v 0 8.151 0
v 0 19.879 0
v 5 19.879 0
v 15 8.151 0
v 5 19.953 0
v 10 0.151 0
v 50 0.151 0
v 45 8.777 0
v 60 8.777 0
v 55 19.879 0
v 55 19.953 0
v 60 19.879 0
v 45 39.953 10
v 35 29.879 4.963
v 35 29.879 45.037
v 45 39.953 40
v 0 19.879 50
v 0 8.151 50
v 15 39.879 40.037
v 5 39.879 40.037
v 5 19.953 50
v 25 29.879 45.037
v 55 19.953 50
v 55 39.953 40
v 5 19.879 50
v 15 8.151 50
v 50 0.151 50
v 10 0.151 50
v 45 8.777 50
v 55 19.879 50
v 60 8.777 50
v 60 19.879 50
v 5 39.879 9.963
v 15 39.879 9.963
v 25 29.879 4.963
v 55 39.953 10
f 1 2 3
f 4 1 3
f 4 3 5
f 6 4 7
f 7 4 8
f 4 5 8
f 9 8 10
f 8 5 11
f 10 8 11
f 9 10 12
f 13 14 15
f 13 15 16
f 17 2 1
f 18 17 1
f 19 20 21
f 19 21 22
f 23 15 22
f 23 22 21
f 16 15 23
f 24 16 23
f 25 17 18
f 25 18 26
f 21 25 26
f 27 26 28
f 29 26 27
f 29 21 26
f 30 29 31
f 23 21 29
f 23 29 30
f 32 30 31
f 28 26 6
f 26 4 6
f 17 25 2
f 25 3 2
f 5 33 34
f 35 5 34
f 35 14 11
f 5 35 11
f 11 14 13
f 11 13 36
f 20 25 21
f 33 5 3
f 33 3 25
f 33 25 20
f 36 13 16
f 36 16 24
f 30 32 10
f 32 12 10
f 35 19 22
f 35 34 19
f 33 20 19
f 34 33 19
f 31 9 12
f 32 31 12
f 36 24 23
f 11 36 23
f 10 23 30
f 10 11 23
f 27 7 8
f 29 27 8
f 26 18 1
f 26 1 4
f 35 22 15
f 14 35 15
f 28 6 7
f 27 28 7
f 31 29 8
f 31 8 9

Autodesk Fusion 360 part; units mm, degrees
sketch "Front View" plane through (0, 0, 0) normal (0, 0, 1) x (1, 0, 0)
  line L0 (0, 19.879) -> (0, 8.1508)
  line L1 (0, 8.1508) -> (15, 8.1508)
  line L2 (15, 8.1508) -> (10, 0.1508)
  line L3 (10, 0.1508) -> (50, 0.1508)
  line L4 (50, 0.1508) -> (45, 8.777)
  line L5 (45, 8.777) -> (60, 8.777)
  line L6 (60, 8.777) -> (60, 19.879)
  line L7 (60, 19.879) -> (0, 19.879)
  line L8 (5, 19.879) -> (5, 39.879)
  line L9 (5, 39.879) -> (15, 39.879)
  line L10 (25, 29.879) -> (35, 29.879)
  line L11 (45, 39.953) -> (55, 39.953)
  line L12 (55, 39.953) -> (55, 19.879)
  line L13 (15, 39.879) -> (25, 29.879)
  line L14 (35, 29.879) -> (45, 39.953)
  dimension "d1" = 8
  dimension "d2" = 11.7282
  dimension "d3" = 10
  dimension "d4" = 40
  dimension "d5" = 30
  dimension "d6" = 20
  dimension "d7" = 60
  dimension "d8" = 5
  dimension "d9" = 5
  dimension "d10" = 10
  dimension "d11" = 10
  dimension "d12" = 10
  dimension "d13" = 10
  dimension "d14" = 10
  dimension "d16" = 10
  dimension "d17" = 5
extrude "Extrude1" add sketch "Front View" along normal blind 50 contours L0 L1 L2 L3 L4 L5 L6 L7
sketch "Side View" plane through (0, 0, 0) normal (1, 0, 0) x (0, 0, -1)
  line L0 (-50.0346, 20.0445) -> (-40.0346, 38.5513)
  line L1 (-27, 38.5513) -> (-40.0346, 38.5513)
  line L2 (-27, 38.5513) -> (-10.0346, 38.5513)
  line L3 (-0.0346, 20.0445) -> (-10.0346, 38.5513)
  line L4 (-50.0346, 20.0445) -> (-0.0346, 20.0445)
  line L5 (-50.0346, 20.0445) -> (-0.0346, 20.0445)
  line L6 (-0.0346, 20.0445) -> (-0.0346, 8.0445)
  line L7 (-0.0346, 8.0445) -> (-50.0346, 8.0445)
  line L8 (-50.0346, 8.0445) -> (-50.0346, 20.0445)
  line L9 (-50.0346, 8.0445) -> (-0.0346, 8.0445)
  line L10 (-0.0346, 8.0445) -> (-0.0346, 0.0445)
  line L11 (-0.0346, 0.0445) -> (-50.0346, 0.0445)
  line L12 (-50.0346, 0.0445) -> (-50.0346, 8.0445)
  dimension "d32" = 12
  dimension "d33" = 50
  dimension "d34" = 50
  dimension "d35" = 8
  dimension "d36" = 30
  dimension "d37" = 10
  dimension "d38" = 10
extrude "Extrude4" add sketch "Front View" along normal blind 50 contours L7 L8 L9 L10 L11 L12 L13 L14
chamfer "Chamfer2" distance 20 distance2 10 1 edges at (50, 39.953, 0) measured on face at (28.3333, 15.6022, 0)
chamfer "Chamfer3" distance 20 distance2 10 1 edges at (50, 39.953, 50) measured on face at (28.3333, 15.6022, 50)
extrude "Extrude3" [suppressed]
